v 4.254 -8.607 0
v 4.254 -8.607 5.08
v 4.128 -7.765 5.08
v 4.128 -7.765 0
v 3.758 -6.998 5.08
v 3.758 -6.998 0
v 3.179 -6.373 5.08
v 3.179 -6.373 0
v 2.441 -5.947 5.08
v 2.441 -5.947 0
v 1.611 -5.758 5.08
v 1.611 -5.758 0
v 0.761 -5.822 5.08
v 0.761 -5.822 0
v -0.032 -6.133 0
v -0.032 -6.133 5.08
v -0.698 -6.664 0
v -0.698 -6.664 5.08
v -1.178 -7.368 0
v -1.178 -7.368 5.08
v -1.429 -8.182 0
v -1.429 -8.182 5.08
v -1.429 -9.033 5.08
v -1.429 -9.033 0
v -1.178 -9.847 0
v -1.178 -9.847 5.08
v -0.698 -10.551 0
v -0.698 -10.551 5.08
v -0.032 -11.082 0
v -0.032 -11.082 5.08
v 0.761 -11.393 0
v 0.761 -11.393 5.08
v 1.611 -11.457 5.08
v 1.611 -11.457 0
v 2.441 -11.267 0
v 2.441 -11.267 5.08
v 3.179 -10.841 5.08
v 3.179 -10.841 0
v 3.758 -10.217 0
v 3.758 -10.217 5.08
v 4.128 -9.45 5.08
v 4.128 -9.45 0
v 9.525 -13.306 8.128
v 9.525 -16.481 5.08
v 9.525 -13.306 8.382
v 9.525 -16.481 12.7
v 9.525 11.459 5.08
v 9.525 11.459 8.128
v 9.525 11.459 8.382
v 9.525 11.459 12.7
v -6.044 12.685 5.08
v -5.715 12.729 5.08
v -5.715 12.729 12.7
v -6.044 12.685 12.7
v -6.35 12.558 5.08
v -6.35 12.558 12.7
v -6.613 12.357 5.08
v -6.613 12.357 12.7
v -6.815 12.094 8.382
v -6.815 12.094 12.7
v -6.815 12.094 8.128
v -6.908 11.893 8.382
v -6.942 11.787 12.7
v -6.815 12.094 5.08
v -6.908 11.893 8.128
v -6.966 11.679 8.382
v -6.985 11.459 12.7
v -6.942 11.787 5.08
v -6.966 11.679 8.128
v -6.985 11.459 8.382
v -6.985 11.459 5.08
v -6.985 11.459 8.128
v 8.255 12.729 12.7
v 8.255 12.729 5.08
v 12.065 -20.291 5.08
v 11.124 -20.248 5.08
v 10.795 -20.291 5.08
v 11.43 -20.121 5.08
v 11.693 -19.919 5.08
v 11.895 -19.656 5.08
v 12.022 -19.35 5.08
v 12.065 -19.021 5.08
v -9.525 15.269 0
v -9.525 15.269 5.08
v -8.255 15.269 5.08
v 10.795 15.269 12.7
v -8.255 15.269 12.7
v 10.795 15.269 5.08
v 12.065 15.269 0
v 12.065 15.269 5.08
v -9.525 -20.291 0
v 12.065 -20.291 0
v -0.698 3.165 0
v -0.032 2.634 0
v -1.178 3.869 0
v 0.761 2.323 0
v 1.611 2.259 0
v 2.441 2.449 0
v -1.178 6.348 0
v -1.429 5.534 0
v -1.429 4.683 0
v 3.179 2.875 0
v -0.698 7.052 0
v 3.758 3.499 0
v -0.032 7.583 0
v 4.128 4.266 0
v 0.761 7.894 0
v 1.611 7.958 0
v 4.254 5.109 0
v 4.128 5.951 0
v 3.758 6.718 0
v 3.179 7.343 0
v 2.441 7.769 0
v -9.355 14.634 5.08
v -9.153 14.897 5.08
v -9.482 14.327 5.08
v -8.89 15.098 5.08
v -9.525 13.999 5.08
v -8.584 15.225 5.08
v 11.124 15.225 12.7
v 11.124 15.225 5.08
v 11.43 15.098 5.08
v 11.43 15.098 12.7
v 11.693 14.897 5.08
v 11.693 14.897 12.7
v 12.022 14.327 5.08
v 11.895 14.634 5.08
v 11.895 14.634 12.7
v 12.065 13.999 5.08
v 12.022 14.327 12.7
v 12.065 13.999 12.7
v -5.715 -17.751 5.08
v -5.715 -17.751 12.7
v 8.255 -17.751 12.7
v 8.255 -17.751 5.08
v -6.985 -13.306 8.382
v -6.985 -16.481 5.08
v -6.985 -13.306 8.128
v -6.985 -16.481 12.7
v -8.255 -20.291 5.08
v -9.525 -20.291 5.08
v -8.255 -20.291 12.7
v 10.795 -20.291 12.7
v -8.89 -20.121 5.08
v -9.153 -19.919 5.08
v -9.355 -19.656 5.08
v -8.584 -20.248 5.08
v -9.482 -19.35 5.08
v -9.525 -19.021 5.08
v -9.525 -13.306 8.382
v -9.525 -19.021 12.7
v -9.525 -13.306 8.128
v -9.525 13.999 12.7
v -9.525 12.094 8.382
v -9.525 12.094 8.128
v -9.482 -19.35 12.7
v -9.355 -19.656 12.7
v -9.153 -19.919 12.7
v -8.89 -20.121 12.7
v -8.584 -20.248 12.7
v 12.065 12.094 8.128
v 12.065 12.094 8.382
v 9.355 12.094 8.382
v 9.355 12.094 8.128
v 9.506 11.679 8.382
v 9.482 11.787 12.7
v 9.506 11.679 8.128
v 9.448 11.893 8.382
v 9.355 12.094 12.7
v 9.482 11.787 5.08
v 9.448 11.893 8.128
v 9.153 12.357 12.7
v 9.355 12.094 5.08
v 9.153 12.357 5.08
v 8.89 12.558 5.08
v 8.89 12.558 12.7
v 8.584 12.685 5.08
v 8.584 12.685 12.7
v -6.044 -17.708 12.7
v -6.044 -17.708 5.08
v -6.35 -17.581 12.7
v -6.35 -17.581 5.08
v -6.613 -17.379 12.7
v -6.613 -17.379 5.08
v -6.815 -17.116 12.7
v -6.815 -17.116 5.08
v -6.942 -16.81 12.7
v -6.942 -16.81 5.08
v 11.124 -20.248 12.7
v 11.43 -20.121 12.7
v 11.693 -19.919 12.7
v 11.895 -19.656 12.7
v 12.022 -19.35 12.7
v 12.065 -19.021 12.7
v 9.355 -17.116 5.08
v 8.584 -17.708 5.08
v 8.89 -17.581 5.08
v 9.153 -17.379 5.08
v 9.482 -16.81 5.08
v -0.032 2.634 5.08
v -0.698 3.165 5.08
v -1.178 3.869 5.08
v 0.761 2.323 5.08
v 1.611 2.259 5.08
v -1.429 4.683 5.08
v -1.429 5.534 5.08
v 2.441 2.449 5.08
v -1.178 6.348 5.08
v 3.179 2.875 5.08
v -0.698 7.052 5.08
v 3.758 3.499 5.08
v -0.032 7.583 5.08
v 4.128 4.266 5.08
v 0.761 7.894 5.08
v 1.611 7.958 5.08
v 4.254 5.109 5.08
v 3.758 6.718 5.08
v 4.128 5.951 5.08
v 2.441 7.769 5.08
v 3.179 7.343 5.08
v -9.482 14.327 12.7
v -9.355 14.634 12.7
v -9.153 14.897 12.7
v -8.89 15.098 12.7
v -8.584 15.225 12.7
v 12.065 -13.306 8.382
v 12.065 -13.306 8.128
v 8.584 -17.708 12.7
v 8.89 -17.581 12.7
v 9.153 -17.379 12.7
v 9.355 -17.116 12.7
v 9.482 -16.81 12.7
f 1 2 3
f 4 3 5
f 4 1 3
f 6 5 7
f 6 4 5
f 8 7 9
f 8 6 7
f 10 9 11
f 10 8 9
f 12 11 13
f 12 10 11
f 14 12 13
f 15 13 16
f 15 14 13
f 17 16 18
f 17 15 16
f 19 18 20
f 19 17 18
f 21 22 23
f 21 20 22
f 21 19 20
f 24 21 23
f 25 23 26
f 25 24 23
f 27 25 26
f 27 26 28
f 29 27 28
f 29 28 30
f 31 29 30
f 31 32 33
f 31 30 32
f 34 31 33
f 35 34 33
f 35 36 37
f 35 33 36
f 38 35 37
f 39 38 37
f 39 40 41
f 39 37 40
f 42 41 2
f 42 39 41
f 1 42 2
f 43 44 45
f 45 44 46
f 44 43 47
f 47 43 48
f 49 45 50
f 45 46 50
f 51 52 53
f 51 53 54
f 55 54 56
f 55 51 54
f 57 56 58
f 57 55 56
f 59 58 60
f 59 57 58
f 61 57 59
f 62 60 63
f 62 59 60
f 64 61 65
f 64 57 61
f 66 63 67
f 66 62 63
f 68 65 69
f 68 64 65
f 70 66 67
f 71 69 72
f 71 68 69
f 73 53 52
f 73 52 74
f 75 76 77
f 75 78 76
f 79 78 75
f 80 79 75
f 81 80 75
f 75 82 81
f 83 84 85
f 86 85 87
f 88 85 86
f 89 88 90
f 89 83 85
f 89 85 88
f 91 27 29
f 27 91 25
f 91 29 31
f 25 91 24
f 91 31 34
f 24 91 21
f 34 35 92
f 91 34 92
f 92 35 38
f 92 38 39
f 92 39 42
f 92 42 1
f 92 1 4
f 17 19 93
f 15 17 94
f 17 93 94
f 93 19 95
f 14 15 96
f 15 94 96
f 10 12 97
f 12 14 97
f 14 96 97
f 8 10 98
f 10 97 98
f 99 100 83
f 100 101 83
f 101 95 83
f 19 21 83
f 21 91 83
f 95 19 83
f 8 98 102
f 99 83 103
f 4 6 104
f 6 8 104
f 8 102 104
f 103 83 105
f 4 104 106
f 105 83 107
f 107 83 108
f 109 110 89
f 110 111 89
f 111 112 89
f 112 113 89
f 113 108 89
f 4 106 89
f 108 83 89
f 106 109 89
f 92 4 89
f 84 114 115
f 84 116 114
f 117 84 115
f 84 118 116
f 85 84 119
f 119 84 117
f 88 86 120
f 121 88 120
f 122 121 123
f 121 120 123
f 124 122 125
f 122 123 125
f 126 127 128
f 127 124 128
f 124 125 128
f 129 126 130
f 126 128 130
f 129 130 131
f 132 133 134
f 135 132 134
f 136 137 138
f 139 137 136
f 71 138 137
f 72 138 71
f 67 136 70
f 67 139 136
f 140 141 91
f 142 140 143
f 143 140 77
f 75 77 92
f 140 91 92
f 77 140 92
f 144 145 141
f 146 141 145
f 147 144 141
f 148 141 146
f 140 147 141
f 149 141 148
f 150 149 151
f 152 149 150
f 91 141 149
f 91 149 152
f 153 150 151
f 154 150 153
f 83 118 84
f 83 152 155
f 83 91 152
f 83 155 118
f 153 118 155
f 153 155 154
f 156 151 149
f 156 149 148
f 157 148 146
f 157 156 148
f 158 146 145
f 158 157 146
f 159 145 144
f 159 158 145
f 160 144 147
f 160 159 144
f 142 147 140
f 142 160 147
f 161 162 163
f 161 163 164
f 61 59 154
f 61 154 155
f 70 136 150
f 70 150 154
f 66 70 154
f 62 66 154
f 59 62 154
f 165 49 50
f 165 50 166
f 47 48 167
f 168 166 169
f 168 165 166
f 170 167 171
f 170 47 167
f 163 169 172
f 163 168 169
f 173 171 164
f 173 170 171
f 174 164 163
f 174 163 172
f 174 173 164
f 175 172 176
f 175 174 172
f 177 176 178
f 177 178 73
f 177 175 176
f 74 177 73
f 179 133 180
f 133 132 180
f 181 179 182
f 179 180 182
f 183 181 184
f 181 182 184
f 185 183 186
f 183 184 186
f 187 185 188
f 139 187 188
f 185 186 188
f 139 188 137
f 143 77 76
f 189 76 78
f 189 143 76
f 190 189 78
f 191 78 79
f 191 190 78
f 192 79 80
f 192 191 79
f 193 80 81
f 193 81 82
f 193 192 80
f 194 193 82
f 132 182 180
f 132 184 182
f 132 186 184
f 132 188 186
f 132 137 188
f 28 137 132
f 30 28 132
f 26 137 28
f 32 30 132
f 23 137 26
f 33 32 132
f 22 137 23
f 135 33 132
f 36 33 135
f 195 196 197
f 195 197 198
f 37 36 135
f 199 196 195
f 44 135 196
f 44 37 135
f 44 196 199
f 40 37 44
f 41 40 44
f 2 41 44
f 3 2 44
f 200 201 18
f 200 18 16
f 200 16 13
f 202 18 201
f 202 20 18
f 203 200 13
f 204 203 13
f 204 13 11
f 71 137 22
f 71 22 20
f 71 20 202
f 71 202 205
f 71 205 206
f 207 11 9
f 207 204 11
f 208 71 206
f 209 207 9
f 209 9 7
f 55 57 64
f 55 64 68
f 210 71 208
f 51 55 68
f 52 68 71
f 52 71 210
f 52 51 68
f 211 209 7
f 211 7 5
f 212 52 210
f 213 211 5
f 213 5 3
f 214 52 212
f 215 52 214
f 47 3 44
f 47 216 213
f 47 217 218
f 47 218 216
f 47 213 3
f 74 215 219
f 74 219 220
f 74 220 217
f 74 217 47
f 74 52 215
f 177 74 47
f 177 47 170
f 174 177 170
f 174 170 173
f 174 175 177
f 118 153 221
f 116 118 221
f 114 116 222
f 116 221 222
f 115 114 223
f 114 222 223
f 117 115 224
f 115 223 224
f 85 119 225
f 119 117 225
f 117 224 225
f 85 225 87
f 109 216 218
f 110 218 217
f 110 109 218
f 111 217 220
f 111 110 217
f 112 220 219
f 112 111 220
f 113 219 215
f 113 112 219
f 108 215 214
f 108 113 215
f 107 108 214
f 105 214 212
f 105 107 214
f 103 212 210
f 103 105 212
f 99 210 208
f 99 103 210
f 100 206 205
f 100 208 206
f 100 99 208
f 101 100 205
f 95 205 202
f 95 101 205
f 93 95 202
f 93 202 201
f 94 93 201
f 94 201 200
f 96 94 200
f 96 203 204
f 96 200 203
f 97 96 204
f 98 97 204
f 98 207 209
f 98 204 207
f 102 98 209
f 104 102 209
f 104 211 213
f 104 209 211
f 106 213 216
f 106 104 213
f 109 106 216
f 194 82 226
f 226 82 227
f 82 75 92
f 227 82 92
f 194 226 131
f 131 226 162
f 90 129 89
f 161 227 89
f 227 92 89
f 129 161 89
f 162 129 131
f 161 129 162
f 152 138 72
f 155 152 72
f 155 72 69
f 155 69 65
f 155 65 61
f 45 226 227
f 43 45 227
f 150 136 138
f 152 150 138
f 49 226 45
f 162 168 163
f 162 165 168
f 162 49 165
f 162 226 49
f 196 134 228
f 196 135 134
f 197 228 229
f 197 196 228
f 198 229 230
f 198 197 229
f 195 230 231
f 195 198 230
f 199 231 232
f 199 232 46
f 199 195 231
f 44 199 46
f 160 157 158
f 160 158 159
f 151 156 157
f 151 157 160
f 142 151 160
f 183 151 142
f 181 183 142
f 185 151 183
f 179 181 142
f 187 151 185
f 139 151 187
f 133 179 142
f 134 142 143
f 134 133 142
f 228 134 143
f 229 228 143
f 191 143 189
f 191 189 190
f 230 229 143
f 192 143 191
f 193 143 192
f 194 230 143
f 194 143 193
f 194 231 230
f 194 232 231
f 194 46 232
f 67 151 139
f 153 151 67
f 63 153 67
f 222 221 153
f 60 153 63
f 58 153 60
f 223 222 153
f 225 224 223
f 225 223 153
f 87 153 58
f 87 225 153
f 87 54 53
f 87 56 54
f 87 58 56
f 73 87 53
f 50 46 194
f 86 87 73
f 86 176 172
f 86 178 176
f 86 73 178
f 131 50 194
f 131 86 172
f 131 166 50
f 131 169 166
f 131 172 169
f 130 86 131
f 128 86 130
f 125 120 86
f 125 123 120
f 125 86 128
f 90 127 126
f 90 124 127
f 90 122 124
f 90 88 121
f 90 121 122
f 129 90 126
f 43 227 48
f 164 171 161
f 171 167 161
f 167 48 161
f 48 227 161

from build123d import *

# Parameters (mm, degrees)
SKETCH1_W               = 21.59
SKETCH1_H               = 35.56
SKETCH1_R               = 2.8575
BOSS_EXTRUDE1_DEPTH     = 12.7
SKETCH2_W               = 16.51
SKETCH2_H               = 30.48
CUT_EXTRUDE1_DEPTH      = 7.62
FILLET1_R               = 1.27
SKETCH3_W               = 0.254
SKETCH3_H               = 25.4
CUT_EXTRUDE3_DEPTH      = 1
CUT_EXTRUDE3_DEPTH_BACK = 22.59
SKETCH1_2_W             = 21.59
SKETCH1_2_H             = 35.56
SKETCH1_2_R             = 2.8575
BOSS_EXTRUDE2_DEPTH     = 5.08


with BuildPart() as part:
    # Sketch1 → Boss-Extrude1 (new body)
    with BuildSketch(Plane.XY):
        with Locations((1.27, -2.511399464)):
            Rectangle(SKETCH1_W, SKETCH1_H)
        with Locations((1.397, 5.108600536)):
            Circle(SKETCH1_R, mode=Mode.SUBTRACT)
        with Locations((1.397, -8.607399464)):
            Circle(SKETCH1_R, mode=Mode.SUBTRACT)
    extrude(amount=BOSS_EXTRUDE1_DEPTH)

    # Sketch2 → Cut-Extrude1 (cut)
    with BuildSketch(Plane.XY.offset(12.7)):
        with Locations((1.27, -2.511399464)):
            Rectangle(SKETCH2_W, SKETCH2_H)
    extrude(amount=-CUT_EXTRUDE1_DEPTH, mode=Mode.SUBTRACT)

    # Fillet1
    fillet1_edges = [part.edges().sort_by_distance(p)[0] for p in [
        (-6.985, -17.751399464, 8.89),
        (-6.985, 12.728600536, 8.89),
        (9.525, 12.728600536, 8.89),
        (9.525, -17.751399464, 8.89),
        (-9.525, 15.268600536, 6.35),
        (12.065, 15.268600536, 6.35),
        (12.065, -20.291399464, 6.35),
        (-9.525, -20.291399464, 6.35),
    ]]
    fillet(fillet1_edges, radius=FILLET1_R)

    # Sketch3 → Cut-Extrude3 (cut, two sides)
    with BuildSketch(Plane(origin=(12.065, 0, 0), x_dir=(0, 0, -1), z_dir=(1, 0, 0))) as cut_extrude3_sk:
        with Locations((-8.255, -0.606399464)):
            Rectangle(SKETCH3_W, SKETCH3_H)
    extrude(amount=CUT_EXTRUDE3_DEPTH, mode=Mode.SUBTRACT)
    extrude(cut_extrude3_sk.sketch, amount=-CUT_EXTRUDE3_DEPTH_BACK, mode=Mode.SUBTRACT)

    # Sketch1<2> → Boss-Extrude2 (add)
    with BuildSketch(Plane.XY):
        with Locations((1.27, -2.511399464)):
            Rectangle(SKETCH1_2_W, SKETCH1_2_H)
        with Locations((1.397, 5.108600536)):
            Circle(SKETCH1_2_R, mode=Mode.SUBTRACT)
        with Locations((1.397, -8.607399464)):
            Circle(SKETCH1_2_R, mode=Mode.SUBTRACT)
    extrude(amount=BOSS_EXTRUDE2_DEPTH)


solid = part.part
